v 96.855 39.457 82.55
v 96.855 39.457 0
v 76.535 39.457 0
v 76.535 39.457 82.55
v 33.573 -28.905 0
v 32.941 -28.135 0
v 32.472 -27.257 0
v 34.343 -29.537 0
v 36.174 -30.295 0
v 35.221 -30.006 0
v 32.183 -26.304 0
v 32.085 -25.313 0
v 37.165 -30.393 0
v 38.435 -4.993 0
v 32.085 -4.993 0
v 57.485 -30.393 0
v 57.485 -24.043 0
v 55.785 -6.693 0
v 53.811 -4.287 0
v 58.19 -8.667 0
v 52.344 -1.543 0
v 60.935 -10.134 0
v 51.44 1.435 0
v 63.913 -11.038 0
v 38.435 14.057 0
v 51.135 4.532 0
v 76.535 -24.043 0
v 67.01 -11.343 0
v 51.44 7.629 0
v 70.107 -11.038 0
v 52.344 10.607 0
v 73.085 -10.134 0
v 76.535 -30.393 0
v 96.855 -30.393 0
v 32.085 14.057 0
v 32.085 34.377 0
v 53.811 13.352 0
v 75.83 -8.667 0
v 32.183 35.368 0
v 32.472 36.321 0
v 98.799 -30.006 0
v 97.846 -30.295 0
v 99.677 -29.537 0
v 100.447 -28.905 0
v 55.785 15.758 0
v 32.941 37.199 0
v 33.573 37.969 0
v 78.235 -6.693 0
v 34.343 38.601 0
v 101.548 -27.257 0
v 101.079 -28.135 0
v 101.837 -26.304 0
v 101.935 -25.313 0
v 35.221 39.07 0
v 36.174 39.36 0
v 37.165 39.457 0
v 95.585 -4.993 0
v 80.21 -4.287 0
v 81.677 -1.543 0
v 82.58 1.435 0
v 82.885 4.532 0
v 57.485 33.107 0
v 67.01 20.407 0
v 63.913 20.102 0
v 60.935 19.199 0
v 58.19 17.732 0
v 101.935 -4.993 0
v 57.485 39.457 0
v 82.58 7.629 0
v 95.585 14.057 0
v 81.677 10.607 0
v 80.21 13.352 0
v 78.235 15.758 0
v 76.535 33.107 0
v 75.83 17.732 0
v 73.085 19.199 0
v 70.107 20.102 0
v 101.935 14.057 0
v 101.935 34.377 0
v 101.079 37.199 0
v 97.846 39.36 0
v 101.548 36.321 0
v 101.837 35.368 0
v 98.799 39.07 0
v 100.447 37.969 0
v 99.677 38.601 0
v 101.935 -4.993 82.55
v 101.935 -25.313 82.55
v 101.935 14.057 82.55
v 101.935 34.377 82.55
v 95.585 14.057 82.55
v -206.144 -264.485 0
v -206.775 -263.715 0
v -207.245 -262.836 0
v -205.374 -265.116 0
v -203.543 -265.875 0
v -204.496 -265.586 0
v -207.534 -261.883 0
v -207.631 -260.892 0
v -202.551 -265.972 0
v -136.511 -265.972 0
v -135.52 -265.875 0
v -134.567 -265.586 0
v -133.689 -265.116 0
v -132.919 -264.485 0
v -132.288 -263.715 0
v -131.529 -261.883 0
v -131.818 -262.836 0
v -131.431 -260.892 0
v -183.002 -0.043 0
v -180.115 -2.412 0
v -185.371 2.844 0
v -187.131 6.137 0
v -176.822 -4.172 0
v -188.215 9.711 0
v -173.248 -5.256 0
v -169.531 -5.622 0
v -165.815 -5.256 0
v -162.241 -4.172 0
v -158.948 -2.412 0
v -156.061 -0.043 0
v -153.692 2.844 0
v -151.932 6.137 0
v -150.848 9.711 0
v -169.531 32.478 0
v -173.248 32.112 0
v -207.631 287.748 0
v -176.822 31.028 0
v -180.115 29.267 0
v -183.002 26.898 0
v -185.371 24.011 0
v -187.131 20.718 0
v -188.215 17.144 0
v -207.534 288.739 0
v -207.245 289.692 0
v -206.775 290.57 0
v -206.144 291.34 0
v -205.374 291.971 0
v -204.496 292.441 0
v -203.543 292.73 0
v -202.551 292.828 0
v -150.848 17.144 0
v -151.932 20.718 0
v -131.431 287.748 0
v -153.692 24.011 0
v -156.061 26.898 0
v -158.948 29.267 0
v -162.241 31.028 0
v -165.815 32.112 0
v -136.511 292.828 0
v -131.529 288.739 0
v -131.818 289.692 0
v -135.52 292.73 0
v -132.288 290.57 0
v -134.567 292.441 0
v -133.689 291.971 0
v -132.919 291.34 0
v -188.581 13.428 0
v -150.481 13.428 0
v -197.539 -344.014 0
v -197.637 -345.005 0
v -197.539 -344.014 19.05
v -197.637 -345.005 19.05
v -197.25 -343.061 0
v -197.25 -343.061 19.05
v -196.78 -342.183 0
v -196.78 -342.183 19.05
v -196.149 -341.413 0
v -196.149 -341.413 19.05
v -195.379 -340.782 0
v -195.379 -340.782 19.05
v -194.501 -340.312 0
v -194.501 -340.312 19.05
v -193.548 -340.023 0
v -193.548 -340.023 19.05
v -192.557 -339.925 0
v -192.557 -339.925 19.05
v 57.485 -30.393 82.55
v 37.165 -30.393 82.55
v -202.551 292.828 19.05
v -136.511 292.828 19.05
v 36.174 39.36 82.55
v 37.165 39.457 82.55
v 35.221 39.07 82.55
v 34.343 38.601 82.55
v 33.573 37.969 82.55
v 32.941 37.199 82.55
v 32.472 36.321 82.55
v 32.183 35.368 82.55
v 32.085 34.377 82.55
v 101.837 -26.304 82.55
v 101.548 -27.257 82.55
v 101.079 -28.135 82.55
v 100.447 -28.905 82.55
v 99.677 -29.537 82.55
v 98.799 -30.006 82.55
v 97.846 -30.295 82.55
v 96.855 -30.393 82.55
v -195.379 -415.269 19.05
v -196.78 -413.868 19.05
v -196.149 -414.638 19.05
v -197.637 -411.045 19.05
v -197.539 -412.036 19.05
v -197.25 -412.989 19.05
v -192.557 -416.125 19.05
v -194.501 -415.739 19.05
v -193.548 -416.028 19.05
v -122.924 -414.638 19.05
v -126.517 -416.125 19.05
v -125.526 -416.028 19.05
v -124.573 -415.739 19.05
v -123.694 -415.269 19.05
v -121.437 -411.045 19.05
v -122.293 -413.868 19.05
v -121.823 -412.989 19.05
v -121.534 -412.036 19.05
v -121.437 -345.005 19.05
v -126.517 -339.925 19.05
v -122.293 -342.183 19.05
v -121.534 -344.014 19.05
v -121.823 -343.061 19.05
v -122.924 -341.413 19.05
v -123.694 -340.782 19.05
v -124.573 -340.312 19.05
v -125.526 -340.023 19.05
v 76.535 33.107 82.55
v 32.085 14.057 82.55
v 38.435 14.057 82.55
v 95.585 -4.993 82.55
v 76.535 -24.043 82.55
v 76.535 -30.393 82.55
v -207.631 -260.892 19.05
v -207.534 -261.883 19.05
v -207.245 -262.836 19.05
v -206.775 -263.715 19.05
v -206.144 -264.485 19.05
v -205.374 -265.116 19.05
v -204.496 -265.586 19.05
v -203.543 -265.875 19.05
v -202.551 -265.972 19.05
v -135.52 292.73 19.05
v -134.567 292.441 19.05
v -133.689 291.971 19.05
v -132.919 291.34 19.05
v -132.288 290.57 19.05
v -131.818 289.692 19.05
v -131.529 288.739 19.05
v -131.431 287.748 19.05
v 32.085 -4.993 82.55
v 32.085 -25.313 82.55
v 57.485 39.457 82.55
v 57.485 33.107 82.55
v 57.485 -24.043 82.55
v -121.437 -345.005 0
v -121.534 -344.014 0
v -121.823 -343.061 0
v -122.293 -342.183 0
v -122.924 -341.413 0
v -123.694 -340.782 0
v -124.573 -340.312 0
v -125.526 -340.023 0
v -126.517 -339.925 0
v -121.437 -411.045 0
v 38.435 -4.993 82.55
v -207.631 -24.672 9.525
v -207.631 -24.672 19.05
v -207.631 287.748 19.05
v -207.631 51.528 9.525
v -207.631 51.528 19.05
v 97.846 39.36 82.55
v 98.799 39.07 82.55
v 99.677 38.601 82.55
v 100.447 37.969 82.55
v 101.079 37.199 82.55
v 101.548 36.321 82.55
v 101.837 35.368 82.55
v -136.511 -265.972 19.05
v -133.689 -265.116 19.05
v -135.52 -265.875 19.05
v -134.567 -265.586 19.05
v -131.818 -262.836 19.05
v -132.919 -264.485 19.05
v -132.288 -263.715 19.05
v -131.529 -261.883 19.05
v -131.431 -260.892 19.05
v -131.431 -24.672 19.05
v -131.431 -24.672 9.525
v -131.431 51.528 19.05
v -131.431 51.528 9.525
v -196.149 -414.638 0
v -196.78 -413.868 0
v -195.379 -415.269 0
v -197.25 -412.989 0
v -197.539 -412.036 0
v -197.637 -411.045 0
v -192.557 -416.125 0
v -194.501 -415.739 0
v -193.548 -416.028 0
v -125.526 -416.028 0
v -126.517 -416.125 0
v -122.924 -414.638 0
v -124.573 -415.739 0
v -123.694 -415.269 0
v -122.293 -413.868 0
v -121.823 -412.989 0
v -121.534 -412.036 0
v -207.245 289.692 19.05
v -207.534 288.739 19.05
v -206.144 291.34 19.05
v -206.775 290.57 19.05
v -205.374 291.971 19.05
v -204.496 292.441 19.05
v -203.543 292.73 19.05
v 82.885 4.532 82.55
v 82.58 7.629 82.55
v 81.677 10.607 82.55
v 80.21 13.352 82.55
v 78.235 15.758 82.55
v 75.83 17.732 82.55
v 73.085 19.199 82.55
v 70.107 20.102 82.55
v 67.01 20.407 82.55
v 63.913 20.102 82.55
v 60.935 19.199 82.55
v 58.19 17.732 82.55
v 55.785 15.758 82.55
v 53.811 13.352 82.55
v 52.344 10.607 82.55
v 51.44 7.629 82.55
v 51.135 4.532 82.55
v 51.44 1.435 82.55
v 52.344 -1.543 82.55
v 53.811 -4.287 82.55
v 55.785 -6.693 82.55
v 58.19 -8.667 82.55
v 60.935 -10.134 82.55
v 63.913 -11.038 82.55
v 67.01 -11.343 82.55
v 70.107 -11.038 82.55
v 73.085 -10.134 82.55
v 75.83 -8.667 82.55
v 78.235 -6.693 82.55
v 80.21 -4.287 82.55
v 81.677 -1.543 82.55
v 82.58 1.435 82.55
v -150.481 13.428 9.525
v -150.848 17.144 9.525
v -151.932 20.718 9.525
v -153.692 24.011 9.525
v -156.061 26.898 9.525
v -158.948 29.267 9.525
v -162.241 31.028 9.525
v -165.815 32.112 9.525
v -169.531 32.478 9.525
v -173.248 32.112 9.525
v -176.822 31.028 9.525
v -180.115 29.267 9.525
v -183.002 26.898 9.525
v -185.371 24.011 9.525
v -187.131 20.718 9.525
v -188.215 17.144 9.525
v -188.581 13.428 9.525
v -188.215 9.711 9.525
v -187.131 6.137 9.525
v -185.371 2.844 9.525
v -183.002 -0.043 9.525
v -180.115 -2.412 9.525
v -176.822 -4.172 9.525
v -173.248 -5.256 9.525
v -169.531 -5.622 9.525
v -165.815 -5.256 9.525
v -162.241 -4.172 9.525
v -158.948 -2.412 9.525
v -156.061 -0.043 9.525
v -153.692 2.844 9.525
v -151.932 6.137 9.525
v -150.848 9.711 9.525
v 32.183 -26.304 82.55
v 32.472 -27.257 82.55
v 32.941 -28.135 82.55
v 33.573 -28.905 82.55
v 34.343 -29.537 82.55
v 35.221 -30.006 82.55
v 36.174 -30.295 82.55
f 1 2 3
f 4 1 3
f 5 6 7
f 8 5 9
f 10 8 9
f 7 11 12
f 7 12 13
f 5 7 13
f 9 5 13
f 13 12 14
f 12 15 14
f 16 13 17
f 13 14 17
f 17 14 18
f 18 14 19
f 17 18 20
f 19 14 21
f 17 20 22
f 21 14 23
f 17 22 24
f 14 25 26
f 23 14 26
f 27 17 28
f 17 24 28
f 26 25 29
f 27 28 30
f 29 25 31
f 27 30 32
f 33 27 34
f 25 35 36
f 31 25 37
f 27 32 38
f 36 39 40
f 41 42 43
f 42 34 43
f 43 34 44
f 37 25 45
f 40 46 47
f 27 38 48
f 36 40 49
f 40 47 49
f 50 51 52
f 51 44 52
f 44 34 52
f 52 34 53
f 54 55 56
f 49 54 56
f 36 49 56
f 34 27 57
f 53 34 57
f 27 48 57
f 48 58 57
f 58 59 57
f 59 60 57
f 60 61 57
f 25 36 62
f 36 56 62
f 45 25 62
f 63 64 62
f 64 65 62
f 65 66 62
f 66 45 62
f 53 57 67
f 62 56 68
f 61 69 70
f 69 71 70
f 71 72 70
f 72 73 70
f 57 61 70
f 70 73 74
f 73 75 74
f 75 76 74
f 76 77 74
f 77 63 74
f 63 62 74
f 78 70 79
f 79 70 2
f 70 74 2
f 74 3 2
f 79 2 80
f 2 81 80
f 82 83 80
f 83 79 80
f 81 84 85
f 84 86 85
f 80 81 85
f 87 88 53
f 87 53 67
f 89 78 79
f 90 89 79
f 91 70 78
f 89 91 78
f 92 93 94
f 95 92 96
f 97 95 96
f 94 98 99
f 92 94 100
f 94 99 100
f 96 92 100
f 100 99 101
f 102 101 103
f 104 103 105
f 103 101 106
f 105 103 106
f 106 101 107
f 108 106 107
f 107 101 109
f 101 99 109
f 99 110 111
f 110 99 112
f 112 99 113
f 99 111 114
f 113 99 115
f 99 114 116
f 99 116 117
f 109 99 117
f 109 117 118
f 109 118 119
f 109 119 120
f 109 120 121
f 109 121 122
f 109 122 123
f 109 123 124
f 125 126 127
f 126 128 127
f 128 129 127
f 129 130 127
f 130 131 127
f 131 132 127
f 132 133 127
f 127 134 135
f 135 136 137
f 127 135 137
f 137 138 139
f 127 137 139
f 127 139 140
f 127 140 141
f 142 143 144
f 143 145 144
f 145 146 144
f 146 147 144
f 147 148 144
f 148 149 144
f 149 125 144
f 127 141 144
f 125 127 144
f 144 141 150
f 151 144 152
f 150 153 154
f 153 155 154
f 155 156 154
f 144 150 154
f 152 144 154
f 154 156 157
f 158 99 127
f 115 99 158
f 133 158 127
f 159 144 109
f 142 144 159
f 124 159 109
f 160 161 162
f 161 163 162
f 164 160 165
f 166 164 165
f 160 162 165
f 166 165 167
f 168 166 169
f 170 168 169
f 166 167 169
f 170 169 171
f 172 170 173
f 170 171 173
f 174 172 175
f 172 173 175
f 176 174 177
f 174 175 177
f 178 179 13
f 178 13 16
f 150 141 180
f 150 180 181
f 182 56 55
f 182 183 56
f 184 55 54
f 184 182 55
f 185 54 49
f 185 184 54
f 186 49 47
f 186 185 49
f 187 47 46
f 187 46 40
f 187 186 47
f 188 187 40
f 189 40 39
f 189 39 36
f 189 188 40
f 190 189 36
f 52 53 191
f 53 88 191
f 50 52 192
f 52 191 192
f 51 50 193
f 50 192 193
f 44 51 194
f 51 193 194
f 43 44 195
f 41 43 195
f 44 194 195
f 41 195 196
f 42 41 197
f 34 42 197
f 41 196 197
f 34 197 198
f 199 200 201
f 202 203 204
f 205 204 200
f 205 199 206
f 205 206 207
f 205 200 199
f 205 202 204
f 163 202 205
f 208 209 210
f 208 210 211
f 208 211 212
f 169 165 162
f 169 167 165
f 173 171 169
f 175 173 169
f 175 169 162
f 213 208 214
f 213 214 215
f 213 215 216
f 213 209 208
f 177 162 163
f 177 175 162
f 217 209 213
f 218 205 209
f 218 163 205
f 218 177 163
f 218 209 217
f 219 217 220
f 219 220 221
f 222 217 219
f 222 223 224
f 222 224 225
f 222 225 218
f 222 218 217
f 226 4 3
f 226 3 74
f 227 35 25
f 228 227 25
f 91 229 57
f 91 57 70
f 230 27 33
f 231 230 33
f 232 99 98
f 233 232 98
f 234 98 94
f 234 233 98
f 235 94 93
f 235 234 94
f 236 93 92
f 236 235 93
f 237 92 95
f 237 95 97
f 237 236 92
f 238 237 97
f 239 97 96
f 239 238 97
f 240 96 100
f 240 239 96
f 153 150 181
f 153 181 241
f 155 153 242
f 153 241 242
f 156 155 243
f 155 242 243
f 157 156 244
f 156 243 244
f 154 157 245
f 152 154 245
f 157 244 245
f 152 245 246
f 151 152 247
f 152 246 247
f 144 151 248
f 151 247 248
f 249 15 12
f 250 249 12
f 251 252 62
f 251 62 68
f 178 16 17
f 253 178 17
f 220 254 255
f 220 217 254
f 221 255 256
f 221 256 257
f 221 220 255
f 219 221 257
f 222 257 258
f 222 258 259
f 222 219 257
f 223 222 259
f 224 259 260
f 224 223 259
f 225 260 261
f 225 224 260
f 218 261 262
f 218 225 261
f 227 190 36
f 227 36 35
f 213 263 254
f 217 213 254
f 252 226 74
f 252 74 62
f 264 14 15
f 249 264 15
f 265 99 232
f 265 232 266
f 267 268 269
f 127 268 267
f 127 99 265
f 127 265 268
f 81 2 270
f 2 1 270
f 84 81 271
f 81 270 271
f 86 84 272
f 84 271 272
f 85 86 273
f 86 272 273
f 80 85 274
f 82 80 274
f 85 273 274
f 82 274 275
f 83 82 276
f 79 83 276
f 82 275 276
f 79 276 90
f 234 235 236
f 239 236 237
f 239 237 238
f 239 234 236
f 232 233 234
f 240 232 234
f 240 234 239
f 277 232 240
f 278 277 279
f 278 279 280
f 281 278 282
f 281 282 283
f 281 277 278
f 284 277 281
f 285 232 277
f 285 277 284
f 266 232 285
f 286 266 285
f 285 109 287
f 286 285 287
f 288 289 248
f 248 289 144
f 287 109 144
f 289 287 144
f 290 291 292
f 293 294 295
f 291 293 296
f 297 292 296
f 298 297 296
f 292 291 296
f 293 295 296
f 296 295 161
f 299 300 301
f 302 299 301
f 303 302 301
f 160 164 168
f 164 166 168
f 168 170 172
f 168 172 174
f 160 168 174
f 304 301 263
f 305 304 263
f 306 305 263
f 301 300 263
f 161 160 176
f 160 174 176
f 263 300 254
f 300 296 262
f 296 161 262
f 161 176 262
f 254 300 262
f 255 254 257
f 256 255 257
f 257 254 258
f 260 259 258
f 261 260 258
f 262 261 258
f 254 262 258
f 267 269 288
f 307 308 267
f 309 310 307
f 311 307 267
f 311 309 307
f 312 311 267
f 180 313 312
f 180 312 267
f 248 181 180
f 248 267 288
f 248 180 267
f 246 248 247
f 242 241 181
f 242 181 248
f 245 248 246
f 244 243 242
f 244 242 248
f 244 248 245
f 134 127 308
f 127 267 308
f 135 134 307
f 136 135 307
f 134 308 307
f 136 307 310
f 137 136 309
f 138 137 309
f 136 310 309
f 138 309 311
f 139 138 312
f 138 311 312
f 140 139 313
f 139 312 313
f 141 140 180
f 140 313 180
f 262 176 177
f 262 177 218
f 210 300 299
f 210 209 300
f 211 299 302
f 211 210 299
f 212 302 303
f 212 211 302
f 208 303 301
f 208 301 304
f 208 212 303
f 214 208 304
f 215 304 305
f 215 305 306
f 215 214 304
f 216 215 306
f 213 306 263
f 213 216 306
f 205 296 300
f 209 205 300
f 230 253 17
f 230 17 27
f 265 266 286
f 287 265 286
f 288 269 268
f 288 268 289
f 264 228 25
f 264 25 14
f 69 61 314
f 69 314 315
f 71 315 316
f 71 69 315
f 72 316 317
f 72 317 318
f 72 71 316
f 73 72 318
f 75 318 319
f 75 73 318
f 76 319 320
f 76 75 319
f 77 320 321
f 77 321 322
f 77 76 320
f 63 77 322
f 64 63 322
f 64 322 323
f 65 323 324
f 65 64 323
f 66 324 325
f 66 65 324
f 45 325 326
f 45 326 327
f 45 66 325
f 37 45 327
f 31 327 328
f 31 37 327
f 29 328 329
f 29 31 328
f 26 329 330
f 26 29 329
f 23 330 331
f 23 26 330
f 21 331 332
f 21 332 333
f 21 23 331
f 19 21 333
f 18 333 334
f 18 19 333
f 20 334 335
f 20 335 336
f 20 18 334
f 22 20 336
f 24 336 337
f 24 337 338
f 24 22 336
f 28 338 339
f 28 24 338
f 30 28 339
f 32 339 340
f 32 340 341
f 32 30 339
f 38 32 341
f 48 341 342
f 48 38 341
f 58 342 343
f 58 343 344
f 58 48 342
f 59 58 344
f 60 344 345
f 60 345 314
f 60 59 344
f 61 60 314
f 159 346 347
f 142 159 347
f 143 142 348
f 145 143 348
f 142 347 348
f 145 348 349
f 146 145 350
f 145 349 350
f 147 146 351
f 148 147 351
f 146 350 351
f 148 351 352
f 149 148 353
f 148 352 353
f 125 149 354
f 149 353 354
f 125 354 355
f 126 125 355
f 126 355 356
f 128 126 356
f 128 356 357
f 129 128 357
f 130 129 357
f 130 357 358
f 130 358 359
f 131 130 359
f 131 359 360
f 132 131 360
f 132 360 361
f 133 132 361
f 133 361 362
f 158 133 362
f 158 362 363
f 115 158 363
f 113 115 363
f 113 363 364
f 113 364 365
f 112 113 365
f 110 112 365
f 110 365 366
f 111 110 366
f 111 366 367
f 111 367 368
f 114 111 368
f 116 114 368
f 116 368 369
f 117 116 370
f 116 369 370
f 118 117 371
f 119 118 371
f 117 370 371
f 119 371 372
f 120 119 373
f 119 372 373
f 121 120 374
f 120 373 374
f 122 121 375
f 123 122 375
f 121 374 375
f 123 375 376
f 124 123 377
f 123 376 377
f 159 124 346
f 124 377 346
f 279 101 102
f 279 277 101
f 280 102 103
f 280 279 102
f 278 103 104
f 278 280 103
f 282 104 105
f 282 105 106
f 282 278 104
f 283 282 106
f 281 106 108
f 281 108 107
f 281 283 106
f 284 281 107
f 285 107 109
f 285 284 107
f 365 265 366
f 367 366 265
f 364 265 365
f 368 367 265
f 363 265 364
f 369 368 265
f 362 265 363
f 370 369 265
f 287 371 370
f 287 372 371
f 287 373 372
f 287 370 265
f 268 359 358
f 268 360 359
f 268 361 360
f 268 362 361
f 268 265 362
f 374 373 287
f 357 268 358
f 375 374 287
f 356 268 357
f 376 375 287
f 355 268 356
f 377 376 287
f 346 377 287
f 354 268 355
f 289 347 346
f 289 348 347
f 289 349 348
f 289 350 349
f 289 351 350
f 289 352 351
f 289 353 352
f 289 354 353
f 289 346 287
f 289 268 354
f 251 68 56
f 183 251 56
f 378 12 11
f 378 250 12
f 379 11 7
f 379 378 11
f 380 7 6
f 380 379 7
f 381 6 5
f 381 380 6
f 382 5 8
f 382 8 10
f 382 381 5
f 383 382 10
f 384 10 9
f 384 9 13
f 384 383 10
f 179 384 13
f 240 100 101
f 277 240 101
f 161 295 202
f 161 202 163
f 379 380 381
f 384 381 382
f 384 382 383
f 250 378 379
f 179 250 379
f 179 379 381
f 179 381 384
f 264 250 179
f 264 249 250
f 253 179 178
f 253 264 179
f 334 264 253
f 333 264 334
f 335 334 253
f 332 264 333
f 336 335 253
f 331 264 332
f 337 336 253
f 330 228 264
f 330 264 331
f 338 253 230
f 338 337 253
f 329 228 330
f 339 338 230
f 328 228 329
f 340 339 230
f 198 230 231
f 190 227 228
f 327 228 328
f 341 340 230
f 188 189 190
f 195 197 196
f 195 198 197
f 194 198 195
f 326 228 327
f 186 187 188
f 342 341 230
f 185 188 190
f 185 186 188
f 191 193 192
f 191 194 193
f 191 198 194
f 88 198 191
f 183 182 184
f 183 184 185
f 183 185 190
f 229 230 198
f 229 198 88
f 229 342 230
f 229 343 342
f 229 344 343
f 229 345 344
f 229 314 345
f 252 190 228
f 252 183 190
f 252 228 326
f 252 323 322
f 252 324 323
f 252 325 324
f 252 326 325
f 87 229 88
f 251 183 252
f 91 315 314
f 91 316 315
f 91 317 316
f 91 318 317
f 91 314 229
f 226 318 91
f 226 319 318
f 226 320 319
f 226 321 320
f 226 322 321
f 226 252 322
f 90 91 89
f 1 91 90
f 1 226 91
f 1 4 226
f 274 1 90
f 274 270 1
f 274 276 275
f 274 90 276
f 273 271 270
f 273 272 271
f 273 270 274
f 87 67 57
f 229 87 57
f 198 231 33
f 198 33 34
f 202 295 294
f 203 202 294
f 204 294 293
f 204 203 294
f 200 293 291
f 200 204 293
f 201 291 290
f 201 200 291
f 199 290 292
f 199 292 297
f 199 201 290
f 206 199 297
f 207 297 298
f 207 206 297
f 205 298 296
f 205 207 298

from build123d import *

# Parameters (mm, degrees)
F1_R     = 15.875
F2_DEPTH = 82.55
F3_W     = 76.2
F3_H     = 558.8
F4_DEPTH = 19.05
F3_H_2   = 76.2
F5_W     = 76.2
F5_H     = 76.2
F5_R     = 19.05
F6_DEPTH = 9.525
F7_R     = 5.08
F8_R     = 5.08
F9_DEPTH = 19.05
F10_R    = 5.08


with BuildPart() as f2:
    # F1 (on Top) → F2 (new body)
    with BuildSketch(Plane.XY):
        Polygon((57.4850961566, 39.4571875989), (32.0850961566, 39.4571875989), (32.0850961566, 14.0571875989), (38.4350961566, 14.0571875989), (38.4350961566, -4.9928124011), (32.0850961566, -4.9928124011), (32.0850961566, -30.3928124011), (57.4850961566, -30.3928124011), (57.4850961566, -24.0428124011), (76.5350961566, -24.0428124011), (76.5350961566, -30.3928124011), (101.9350961566, -30.3928124011), (101.9350961566, -4.9928124011), (95.5850961566, -4.9928124011), (95.5850961566, 14.0571875989), (101.9350961566, 14.0571875989), (101.9350961566, 39.4571875989), (76.5350961566, 39.4571875989), (76.5350961566, 33.1071875989), (57.4850961566, 33.1071875989), align=None)
        with Locations((67.0100961566, 4.5321875989)):
            Circle(F1_R, mode=Mode.SUBTRACT)
    extrude(amount=F2_DEPTH)

    # F8
    f8_edges = [f2.edges().sort_by_distance(p)[0] for p in [
        (101.935096, -30.392812, 41.275),
        (32.085096, -30.392812, 41.275),
        (101.935096, 39.457188, 41.275),
        (32.085096, 39.457188, 41.275),
    ]]
    fillet(f8_edges, radius=F8_R)


with BuildPart() as f4:
    # F3 (on Top) → F4 (new body)
    with BuildSketch(Plane.XY):
        with Locations((-169.5314869285, 13.4275996701)):
            Rectangle(F3_W, F3_H)
    extrude(amount=F4_DEPTH)

    # F5 (on face) → F6 (cut)
    with BuildSketch(Plane.XY.offset(19.05)):
        with Locations((-169.5314869285, 13.4275996701)):
            Rectangle(F5_W, F5_H)
        with Locations((-169.5314869285, 13.4275996701)):
            Circle(F5_R, mode=Mode.SUBTRACT)
        with Locations((-169.5314869285, 13.4275996701)):
            Circle(F5_R)
    extrude(amount=-F6_DEPTH, mode=Mode.SUBTRACT)

    # F7
    f7_edges = [f4.edges().sort_by_distance(p)[0] for p in [
        (-207.631487, 292.8276, 9.525),
        (-131.431487, 292.8276, 9.525),
        (-207.631487, -265.9724, 9.525),
        (-131.431487, -265.9724, 9.525),
    ]]
    fillet(f7_edges, radius=F7_R)

    # F5 (on face) → F9 (cut, through all)
    with BuildSketch(Plane.XY.offset(19.05)):
        with Locations((-169.5314869285, 13.4275996701)):
            Circle(F5_R)
    extrude(amount=-F9_DEPTH, mode=Mode.SUBTRACT)


with BuildPart() as f4b:
    # F3 (on Top) → F4, piece 2 (new body)
    with BuildSketch(Plane.XY):
        with Locations((-159.5365894079, -378.0254381657)):
            Rectangle(F3_W, F3_H_2)
    extrude(amount=F4_DEPTH)

    # F10
    f10_edges = [f4b.edges().sort_by_distance(p)[0] for p in [
        (-197.636589, -416.125438, 9.525),
        (-121.436589, -416.125438, 9.525),
        (-121.436589, -339.925438, 9.525),
        (-197.636589, -339.925438, 9.525),
    ]]
    fillet(f10_edges, radius=F10_R)


solid = Compound([f2.part, f4.part, f4b.part])
